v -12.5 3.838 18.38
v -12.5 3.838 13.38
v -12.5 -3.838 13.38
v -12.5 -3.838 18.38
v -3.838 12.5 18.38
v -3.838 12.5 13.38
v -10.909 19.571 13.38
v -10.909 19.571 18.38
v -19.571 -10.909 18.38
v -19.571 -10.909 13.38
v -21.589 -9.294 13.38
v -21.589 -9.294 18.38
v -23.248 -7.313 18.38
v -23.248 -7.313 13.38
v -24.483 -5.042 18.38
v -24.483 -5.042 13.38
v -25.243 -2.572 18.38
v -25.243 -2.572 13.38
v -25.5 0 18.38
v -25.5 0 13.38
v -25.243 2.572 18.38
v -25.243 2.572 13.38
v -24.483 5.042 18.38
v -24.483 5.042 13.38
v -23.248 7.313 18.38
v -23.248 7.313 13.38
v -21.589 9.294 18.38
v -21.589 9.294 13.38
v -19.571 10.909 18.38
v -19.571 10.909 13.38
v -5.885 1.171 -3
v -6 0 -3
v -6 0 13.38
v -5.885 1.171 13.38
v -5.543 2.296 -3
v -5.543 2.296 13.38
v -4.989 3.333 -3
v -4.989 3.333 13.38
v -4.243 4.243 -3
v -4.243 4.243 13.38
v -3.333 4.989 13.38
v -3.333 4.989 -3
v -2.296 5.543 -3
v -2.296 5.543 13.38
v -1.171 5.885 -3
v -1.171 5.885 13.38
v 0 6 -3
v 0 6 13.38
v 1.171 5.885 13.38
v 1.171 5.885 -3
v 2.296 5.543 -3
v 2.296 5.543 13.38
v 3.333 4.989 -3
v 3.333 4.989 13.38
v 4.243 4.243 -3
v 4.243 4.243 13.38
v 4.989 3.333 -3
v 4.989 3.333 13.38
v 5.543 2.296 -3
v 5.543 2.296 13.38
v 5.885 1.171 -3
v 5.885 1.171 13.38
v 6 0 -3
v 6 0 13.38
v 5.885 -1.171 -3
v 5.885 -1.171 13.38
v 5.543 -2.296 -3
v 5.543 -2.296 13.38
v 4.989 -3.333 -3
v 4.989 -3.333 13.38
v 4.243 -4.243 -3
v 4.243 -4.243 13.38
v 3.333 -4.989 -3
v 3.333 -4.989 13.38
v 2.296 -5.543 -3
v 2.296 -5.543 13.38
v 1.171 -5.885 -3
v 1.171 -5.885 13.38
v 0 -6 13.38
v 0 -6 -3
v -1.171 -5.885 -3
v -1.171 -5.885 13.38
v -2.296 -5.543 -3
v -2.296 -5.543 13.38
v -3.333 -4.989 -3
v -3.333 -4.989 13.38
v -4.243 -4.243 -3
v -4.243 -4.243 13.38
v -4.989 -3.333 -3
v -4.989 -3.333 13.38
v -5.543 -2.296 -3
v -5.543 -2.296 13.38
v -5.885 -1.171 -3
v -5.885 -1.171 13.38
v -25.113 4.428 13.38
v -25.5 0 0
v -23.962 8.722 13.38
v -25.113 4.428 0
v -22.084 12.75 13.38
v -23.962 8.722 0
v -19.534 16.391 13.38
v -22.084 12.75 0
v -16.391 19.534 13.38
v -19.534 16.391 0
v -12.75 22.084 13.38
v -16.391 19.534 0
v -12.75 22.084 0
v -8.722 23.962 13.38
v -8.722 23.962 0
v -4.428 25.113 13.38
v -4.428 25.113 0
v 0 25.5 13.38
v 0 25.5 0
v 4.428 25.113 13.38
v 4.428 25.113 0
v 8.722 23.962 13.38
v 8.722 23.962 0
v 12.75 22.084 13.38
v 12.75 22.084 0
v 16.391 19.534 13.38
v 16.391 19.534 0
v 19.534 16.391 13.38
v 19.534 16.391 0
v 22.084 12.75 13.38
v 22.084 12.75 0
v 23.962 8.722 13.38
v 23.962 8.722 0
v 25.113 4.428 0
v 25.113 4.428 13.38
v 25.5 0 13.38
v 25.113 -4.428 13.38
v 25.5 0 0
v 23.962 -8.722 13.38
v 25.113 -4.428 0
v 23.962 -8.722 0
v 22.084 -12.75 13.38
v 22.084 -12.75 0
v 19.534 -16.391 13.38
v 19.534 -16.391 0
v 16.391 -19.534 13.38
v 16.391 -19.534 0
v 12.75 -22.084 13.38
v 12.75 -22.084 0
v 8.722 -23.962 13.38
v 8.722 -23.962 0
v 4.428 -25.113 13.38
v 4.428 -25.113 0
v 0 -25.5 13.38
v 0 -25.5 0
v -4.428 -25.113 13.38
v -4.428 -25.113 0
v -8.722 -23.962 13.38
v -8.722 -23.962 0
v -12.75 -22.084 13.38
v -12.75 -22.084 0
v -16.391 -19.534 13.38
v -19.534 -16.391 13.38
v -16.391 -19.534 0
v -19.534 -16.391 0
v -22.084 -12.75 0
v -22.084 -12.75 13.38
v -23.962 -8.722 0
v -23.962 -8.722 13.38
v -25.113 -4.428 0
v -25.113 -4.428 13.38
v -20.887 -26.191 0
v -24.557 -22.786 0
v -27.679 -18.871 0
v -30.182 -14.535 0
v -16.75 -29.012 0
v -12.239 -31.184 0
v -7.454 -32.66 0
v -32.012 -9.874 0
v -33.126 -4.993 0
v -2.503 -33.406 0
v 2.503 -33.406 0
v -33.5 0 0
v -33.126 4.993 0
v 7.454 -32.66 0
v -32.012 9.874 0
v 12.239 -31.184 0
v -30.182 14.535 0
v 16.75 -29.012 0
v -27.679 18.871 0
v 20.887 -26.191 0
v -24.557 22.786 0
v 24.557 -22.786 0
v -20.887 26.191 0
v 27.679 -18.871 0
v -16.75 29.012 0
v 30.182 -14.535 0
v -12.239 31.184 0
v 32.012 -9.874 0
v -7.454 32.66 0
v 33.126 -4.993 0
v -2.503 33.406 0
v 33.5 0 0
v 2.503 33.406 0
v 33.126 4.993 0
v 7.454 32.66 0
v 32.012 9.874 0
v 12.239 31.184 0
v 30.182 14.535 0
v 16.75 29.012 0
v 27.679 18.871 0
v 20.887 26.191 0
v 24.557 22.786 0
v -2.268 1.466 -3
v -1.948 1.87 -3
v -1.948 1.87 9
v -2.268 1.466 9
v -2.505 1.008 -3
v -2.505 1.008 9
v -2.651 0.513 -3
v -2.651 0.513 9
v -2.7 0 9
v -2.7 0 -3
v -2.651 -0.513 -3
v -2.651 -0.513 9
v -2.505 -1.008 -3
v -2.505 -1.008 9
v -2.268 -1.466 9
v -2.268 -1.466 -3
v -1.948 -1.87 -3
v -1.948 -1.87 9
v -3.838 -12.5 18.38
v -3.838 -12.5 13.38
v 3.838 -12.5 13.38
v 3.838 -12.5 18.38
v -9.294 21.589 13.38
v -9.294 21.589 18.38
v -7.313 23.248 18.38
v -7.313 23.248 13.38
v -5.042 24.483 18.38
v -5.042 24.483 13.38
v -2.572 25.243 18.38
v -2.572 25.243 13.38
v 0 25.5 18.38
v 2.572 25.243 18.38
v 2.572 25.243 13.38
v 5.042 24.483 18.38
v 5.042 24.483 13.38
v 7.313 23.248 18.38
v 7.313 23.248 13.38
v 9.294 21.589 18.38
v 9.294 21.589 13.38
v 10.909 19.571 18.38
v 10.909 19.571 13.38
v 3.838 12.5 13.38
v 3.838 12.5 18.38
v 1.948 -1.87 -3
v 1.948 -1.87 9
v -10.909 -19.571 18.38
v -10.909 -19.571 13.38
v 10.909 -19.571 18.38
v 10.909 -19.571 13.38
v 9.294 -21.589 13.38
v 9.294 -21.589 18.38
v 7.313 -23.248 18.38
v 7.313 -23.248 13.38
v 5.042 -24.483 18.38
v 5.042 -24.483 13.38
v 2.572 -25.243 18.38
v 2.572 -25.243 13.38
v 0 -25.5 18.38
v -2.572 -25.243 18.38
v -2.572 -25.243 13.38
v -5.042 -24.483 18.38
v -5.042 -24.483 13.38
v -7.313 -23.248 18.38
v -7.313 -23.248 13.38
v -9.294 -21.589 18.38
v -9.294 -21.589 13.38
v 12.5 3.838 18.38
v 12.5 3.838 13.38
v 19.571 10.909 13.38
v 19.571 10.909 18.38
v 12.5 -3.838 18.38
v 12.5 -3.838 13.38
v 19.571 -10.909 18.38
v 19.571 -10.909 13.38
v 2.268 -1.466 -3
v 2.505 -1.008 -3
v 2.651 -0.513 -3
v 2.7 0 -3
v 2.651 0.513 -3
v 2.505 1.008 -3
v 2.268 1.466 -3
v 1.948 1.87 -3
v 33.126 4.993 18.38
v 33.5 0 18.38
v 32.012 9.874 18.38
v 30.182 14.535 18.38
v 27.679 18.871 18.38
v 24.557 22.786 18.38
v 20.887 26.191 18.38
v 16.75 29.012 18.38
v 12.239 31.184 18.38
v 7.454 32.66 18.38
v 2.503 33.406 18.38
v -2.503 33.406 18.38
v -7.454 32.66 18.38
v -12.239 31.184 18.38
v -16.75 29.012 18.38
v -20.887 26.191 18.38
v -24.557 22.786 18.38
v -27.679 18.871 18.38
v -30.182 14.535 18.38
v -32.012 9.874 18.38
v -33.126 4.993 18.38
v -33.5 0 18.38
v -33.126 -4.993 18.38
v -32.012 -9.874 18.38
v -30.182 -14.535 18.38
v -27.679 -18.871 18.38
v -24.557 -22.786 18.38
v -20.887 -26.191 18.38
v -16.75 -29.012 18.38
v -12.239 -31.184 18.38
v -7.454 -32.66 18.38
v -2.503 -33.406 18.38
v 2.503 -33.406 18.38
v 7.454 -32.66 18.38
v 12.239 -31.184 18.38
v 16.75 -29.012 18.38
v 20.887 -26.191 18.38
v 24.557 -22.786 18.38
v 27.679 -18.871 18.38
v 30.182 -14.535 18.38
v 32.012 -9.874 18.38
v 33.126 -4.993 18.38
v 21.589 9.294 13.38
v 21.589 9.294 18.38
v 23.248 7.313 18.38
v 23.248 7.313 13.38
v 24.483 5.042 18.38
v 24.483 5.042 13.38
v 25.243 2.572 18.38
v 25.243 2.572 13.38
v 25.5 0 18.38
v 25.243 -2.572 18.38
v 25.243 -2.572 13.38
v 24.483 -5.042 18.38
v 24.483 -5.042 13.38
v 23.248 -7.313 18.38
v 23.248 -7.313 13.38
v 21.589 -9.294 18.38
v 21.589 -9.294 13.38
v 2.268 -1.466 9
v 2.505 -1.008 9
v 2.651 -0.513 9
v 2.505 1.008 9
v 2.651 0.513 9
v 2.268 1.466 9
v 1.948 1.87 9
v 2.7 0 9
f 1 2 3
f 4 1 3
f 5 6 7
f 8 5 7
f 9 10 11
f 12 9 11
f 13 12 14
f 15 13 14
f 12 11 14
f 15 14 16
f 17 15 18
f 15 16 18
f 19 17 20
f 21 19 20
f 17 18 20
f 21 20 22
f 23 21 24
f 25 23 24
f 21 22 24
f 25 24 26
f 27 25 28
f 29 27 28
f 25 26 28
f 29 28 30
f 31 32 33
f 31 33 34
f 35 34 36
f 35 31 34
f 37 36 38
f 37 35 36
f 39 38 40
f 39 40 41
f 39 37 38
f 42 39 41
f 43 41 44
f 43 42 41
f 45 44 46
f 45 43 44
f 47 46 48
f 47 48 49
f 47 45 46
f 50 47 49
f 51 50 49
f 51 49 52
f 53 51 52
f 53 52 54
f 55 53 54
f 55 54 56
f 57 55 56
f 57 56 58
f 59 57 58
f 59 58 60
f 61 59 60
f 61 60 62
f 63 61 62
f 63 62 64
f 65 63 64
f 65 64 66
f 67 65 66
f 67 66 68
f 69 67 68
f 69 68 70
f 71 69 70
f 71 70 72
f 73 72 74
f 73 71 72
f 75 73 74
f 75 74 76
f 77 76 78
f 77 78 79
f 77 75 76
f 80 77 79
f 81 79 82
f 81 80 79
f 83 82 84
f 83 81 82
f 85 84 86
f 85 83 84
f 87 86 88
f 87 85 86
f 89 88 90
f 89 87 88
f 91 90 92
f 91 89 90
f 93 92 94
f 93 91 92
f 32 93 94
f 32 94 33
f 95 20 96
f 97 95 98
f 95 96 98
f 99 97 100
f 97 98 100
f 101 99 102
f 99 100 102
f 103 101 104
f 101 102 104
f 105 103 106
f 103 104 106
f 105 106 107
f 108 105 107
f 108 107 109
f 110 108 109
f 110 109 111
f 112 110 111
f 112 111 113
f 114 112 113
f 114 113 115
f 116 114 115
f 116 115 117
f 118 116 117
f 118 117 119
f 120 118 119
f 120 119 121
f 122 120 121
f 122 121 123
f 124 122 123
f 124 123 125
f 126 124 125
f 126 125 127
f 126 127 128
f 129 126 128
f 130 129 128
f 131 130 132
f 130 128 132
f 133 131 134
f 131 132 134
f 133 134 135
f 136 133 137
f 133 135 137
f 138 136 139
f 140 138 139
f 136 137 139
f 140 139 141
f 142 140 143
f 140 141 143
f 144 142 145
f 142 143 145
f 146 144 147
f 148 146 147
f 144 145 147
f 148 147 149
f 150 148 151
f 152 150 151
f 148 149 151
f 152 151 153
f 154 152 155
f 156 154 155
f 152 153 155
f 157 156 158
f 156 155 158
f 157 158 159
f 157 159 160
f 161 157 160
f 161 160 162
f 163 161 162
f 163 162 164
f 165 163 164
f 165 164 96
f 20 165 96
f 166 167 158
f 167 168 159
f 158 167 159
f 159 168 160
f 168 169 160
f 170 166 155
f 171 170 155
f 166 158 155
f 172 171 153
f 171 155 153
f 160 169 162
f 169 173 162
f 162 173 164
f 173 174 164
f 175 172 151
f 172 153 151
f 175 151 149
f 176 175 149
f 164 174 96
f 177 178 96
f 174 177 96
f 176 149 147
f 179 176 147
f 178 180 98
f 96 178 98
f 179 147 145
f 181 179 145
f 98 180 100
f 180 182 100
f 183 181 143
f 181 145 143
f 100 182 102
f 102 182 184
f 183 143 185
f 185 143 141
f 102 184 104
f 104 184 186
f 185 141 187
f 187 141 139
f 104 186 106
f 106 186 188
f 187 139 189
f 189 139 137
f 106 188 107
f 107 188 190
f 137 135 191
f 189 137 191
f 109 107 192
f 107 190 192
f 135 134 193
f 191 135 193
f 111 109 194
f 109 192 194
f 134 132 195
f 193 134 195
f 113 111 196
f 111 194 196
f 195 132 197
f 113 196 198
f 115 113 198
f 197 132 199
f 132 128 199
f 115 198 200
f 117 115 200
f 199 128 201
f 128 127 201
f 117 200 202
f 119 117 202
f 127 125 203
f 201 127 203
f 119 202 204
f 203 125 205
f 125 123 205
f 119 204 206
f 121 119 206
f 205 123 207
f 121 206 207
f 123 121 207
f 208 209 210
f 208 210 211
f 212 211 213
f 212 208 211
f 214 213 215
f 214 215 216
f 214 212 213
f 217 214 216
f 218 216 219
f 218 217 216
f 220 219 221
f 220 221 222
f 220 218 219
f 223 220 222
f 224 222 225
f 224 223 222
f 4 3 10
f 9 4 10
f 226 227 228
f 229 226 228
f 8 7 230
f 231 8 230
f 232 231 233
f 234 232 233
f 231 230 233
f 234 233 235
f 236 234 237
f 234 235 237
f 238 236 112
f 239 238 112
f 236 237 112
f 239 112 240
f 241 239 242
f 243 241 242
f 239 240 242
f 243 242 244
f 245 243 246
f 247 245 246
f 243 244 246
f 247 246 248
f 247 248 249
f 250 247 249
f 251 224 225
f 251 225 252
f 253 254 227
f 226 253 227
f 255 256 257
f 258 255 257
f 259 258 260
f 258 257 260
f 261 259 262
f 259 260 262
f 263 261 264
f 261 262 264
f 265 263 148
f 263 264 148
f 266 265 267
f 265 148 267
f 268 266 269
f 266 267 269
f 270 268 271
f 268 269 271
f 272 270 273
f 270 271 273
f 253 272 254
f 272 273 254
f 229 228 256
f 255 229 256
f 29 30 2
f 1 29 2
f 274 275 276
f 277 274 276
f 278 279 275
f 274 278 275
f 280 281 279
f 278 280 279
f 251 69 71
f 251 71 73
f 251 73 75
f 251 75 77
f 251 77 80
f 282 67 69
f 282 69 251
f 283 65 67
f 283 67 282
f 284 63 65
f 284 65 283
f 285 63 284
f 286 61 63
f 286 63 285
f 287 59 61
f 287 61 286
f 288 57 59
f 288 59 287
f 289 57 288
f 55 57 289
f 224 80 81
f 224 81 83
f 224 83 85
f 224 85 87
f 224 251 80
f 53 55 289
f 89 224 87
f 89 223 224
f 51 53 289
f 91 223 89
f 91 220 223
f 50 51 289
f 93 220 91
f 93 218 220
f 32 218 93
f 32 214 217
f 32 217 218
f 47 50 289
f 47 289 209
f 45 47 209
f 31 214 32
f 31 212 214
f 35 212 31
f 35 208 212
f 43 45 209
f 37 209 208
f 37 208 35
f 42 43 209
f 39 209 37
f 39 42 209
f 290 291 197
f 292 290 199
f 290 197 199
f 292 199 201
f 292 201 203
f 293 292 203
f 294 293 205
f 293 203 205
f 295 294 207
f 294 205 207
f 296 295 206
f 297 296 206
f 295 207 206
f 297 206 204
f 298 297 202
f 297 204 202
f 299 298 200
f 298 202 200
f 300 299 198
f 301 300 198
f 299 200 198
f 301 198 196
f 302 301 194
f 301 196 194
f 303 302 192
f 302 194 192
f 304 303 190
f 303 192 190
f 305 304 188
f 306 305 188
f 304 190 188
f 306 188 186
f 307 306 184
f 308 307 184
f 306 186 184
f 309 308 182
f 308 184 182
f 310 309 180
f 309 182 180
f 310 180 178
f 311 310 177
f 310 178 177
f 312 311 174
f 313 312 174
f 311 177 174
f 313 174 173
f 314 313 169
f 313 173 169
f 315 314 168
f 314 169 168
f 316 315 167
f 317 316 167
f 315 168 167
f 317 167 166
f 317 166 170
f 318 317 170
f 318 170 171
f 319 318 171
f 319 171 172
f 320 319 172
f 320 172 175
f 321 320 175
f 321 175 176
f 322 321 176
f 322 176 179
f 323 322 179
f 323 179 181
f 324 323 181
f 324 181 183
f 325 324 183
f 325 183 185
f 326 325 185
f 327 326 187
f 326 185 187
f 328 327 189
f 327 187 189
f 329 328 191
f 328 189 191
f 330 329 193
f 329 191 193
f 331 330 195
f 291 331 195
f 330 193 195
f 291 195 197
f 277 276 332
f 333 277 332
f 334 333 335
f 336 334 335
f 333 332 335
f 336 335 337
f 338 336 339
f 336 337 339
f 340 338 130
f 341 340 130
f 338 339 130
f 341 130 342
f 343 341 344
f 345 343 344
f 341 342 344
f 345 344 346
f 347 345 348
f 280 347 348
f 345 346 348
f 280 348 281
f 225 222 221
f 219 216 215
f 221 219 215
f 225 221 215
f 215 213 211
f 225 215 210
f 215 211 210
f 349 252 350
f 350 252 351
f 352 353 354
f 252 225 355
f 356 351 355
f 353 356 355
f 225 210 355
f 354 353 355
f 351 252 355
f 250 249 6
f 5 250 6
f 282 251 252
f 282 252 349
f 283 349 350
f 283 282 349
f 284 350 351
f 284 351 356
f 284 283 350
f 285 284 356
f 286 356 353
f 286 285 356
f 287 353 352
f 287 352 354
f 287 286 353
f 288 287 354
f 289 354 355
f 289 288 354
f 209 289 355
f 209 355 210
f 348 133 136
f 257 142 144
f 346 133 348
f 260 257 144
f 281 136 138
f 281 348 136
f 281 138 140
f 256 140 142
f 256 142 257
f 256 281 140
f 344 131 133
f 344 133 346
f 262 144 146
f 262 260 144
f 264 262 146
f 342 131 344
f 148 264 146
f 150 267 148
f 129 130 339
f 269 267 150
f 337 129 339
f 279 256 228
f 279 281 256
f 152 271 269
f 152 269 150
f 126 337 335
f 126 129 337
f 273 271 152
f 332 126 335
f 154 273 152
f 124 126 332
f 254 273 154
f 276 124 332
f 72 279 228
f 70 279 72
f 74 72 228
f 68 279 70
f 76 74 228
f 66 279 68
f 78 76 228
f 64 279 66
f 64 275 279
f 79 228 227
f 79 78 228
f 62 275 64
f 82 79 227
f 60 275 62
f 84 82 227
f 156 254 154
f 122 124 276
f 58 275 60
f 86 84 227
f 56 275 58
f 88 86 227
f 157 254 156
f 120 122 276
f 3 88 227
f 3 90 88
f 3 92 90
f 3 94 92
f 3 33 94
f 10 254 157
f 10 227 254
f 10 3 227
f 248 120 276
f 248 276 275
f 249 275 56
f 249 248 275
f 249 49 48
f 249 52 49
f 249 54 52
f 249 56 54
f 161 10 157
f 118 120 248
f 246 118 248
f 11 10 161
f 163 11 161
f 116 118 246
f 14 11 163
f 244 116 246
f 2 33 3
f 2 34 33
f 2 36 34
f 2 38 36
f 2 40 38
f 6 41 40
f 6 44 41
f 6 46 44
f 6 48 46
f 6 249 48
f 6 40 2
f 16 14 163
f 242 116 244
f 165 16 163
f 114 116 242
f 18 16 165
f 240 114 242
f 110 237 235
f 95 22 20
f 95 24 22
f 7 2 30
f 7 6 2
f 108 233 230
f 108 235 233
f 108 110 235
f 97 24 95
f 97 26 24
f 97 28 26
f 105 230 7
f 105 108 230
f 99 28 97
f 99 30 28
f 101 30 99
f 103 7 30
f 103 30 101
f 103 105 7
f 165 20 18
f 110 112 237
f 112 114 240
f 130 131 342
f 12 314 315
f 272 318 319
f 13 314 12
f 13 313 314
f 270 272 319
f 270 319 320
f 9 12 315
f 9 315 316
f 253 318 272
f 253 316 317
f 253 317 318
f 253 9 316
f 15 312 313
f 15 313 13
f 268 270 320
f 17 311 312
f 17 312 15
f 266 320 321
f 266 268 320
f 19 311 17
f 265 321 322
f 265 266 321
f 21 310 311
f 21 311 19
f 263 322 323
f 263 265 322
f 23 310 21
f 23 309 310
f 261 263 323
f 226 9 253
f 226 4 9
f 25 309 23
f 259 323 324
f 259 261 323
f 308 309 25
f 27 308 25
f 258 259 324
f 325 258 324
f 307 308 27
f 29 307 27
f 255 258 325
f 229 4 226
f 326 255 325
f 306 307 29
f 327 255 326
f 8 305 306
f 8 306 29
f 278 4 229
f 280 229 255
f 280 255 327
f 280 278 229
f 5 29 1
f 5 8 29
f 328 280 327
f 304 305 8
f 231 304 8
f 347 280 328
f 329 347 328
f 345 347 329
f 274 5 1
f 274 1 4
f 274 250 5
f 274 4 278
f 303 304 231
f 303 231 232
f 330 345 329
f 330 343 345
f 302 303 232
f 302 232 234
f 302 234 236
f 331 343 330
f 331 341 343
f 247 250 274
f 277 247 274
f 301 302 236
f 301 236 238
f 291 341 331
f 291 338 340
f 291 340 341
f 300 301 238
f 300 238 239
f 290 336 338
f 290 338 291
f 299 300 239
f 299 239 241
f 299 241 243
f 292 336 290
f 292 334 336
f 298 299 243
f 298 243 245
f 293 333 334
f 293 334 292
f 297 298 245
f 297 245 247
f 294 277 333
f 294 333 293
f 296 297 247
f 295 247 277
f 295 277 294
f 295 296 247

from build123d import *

# Parameters (mm, degrees)
SKETCH_1_R          = 33.5
EXTRUDE_1_DEPTH     = 18.38
CUT_EXTRUDE_1_DEPTH = 18.5
SKETCH_3_R          = 25.5
SKETCH_3_R_2        = 6
CUT_EXTRUDE_2_DEPTH = 13.38
EXTRUDE_START       = 3
SKETCH_5_R          = 6
EXTRUDE_2_DEPTH     = 3
CUT_EXTRUDE_3_DEPTH = 12


with BuildPart() as part:
    # 草图1 → 凸台-拉伸1 (new body)
    with BuildSketch(Plane.XY):
        Circle(SKETCH_1_R)
    extrude(amount=EXTRUDE_1_DEPTH)

    # 草图2 → 切除-拉伸1 (cut)
    with BuildSketch(Plane(origin=(0, 0, 0), x_dir=(-1, 0, 0), z_dir=(0, 0, -1))):
        with BuildLine():
            Line((-10.908712115, 19.571067812), (-3.837644303, 12.5))
            Line((-3.837644303, 12.5), (3.837644303, 12.5))
            Line((3.837644303, 12.5), (10.908712115, 19.571067812))
            ThreePointArc((10.908712115, 19.571067812), (0, 25.5), (-10.908712115, 19.571067812))
        make_face()
        with BuildLine():
            Line((19.571067812, 10.908712115), (12.5, 3.837644303))
            Line((12.5, 3.837644303), (12.5, -3.837644303))
            Line((12.5, -3.837644303), (19.571067812, -10.908712115))
            ThreePointArc((19.571067812, -10.908712115), (25.5, 0), (19.571067812, 10.908712115))
        make_face()
        with BuildLine():
            Line((10.908712115, -19.571067812), (3.837644303, -12.5))
            Line((3.837644303, -12.5), (-3.837644303, -12.5))
            Line((-3.837644303, -12.5), (-10.908712115, -19.571067812))
            ThreePointArc((-10.908712115, -19.571067812), (0, -25.5), (10.908712115, -19.571067812))
        make_face()
        with BuildLine():
            Line((-19.571067812, -10.908712115), (-12.5, -3.837644303))
            Line((-12.5, -3.837644303), (-12.5, 3.837644303))
            Line((-12.5, 3.837644303), (-19.571067812, 10.908712115))
            ThreePointArc((-19.571067812, 10.908712115), (-25.5, 0), (-19.571067812, -10.908712115))
        make_face()
    extrude(amount=-CUT_EXTRUDE_1_DEPTH, mode=Mode.SUBTRACT)

    # 草图3 → 切除-拉伸2 (cut)
    with BuildSketch(Plane(origin=(0, 0, 0), x_dir=(-1, 0, 0), z_dir=(0, 0, -1))):
        Circle(SKETCH_3_R)
        Circle(SKETCH_3_R_2, mode=Mode.SUBTRACT)
    extrude(amount=-CUT_EXTRUDE_2_DEPTH, mode=Mode.SUBTRACT)

    # 草图5 → 凸台-拉伸2 (add)
    with BuildSketch(Plane(origin=(0, 0, 0), x_dir=(-1, 0, 0), z_dir=(0, 0, -1)).offset(EXTRUDE_START)):
        Circle(SKETCH_5_R)
    extrude(amount=-EXTRUDE_2_DEPTH)

    # 草图6 → 切除-拉伸3 (cut)
    with BuildSketch(Plane(origin=(0, 0, -3), x_dir=(-1, 0, 0), z_dir=(0, 0, -1))):
        with BuildLine():
            Line((-1.947588252, 1.87), (1.947588252, 1.87))
            ThreePointArc((1.947588252, 1.87), (2.7, 0), (1.947588252, -1.87))
            Line((1.947588252, -1.87), (-1.947588252, -1.87))
            ThreePointArc((-1.947588252, -1.87), (-2.7, 0), (-1.947588252, 1.87))
        make_face()
    extrude(amount=-CUT_EXTRUDE_3_DEPTH, mode=Mode.SUBTRACT)


solid = part.part
